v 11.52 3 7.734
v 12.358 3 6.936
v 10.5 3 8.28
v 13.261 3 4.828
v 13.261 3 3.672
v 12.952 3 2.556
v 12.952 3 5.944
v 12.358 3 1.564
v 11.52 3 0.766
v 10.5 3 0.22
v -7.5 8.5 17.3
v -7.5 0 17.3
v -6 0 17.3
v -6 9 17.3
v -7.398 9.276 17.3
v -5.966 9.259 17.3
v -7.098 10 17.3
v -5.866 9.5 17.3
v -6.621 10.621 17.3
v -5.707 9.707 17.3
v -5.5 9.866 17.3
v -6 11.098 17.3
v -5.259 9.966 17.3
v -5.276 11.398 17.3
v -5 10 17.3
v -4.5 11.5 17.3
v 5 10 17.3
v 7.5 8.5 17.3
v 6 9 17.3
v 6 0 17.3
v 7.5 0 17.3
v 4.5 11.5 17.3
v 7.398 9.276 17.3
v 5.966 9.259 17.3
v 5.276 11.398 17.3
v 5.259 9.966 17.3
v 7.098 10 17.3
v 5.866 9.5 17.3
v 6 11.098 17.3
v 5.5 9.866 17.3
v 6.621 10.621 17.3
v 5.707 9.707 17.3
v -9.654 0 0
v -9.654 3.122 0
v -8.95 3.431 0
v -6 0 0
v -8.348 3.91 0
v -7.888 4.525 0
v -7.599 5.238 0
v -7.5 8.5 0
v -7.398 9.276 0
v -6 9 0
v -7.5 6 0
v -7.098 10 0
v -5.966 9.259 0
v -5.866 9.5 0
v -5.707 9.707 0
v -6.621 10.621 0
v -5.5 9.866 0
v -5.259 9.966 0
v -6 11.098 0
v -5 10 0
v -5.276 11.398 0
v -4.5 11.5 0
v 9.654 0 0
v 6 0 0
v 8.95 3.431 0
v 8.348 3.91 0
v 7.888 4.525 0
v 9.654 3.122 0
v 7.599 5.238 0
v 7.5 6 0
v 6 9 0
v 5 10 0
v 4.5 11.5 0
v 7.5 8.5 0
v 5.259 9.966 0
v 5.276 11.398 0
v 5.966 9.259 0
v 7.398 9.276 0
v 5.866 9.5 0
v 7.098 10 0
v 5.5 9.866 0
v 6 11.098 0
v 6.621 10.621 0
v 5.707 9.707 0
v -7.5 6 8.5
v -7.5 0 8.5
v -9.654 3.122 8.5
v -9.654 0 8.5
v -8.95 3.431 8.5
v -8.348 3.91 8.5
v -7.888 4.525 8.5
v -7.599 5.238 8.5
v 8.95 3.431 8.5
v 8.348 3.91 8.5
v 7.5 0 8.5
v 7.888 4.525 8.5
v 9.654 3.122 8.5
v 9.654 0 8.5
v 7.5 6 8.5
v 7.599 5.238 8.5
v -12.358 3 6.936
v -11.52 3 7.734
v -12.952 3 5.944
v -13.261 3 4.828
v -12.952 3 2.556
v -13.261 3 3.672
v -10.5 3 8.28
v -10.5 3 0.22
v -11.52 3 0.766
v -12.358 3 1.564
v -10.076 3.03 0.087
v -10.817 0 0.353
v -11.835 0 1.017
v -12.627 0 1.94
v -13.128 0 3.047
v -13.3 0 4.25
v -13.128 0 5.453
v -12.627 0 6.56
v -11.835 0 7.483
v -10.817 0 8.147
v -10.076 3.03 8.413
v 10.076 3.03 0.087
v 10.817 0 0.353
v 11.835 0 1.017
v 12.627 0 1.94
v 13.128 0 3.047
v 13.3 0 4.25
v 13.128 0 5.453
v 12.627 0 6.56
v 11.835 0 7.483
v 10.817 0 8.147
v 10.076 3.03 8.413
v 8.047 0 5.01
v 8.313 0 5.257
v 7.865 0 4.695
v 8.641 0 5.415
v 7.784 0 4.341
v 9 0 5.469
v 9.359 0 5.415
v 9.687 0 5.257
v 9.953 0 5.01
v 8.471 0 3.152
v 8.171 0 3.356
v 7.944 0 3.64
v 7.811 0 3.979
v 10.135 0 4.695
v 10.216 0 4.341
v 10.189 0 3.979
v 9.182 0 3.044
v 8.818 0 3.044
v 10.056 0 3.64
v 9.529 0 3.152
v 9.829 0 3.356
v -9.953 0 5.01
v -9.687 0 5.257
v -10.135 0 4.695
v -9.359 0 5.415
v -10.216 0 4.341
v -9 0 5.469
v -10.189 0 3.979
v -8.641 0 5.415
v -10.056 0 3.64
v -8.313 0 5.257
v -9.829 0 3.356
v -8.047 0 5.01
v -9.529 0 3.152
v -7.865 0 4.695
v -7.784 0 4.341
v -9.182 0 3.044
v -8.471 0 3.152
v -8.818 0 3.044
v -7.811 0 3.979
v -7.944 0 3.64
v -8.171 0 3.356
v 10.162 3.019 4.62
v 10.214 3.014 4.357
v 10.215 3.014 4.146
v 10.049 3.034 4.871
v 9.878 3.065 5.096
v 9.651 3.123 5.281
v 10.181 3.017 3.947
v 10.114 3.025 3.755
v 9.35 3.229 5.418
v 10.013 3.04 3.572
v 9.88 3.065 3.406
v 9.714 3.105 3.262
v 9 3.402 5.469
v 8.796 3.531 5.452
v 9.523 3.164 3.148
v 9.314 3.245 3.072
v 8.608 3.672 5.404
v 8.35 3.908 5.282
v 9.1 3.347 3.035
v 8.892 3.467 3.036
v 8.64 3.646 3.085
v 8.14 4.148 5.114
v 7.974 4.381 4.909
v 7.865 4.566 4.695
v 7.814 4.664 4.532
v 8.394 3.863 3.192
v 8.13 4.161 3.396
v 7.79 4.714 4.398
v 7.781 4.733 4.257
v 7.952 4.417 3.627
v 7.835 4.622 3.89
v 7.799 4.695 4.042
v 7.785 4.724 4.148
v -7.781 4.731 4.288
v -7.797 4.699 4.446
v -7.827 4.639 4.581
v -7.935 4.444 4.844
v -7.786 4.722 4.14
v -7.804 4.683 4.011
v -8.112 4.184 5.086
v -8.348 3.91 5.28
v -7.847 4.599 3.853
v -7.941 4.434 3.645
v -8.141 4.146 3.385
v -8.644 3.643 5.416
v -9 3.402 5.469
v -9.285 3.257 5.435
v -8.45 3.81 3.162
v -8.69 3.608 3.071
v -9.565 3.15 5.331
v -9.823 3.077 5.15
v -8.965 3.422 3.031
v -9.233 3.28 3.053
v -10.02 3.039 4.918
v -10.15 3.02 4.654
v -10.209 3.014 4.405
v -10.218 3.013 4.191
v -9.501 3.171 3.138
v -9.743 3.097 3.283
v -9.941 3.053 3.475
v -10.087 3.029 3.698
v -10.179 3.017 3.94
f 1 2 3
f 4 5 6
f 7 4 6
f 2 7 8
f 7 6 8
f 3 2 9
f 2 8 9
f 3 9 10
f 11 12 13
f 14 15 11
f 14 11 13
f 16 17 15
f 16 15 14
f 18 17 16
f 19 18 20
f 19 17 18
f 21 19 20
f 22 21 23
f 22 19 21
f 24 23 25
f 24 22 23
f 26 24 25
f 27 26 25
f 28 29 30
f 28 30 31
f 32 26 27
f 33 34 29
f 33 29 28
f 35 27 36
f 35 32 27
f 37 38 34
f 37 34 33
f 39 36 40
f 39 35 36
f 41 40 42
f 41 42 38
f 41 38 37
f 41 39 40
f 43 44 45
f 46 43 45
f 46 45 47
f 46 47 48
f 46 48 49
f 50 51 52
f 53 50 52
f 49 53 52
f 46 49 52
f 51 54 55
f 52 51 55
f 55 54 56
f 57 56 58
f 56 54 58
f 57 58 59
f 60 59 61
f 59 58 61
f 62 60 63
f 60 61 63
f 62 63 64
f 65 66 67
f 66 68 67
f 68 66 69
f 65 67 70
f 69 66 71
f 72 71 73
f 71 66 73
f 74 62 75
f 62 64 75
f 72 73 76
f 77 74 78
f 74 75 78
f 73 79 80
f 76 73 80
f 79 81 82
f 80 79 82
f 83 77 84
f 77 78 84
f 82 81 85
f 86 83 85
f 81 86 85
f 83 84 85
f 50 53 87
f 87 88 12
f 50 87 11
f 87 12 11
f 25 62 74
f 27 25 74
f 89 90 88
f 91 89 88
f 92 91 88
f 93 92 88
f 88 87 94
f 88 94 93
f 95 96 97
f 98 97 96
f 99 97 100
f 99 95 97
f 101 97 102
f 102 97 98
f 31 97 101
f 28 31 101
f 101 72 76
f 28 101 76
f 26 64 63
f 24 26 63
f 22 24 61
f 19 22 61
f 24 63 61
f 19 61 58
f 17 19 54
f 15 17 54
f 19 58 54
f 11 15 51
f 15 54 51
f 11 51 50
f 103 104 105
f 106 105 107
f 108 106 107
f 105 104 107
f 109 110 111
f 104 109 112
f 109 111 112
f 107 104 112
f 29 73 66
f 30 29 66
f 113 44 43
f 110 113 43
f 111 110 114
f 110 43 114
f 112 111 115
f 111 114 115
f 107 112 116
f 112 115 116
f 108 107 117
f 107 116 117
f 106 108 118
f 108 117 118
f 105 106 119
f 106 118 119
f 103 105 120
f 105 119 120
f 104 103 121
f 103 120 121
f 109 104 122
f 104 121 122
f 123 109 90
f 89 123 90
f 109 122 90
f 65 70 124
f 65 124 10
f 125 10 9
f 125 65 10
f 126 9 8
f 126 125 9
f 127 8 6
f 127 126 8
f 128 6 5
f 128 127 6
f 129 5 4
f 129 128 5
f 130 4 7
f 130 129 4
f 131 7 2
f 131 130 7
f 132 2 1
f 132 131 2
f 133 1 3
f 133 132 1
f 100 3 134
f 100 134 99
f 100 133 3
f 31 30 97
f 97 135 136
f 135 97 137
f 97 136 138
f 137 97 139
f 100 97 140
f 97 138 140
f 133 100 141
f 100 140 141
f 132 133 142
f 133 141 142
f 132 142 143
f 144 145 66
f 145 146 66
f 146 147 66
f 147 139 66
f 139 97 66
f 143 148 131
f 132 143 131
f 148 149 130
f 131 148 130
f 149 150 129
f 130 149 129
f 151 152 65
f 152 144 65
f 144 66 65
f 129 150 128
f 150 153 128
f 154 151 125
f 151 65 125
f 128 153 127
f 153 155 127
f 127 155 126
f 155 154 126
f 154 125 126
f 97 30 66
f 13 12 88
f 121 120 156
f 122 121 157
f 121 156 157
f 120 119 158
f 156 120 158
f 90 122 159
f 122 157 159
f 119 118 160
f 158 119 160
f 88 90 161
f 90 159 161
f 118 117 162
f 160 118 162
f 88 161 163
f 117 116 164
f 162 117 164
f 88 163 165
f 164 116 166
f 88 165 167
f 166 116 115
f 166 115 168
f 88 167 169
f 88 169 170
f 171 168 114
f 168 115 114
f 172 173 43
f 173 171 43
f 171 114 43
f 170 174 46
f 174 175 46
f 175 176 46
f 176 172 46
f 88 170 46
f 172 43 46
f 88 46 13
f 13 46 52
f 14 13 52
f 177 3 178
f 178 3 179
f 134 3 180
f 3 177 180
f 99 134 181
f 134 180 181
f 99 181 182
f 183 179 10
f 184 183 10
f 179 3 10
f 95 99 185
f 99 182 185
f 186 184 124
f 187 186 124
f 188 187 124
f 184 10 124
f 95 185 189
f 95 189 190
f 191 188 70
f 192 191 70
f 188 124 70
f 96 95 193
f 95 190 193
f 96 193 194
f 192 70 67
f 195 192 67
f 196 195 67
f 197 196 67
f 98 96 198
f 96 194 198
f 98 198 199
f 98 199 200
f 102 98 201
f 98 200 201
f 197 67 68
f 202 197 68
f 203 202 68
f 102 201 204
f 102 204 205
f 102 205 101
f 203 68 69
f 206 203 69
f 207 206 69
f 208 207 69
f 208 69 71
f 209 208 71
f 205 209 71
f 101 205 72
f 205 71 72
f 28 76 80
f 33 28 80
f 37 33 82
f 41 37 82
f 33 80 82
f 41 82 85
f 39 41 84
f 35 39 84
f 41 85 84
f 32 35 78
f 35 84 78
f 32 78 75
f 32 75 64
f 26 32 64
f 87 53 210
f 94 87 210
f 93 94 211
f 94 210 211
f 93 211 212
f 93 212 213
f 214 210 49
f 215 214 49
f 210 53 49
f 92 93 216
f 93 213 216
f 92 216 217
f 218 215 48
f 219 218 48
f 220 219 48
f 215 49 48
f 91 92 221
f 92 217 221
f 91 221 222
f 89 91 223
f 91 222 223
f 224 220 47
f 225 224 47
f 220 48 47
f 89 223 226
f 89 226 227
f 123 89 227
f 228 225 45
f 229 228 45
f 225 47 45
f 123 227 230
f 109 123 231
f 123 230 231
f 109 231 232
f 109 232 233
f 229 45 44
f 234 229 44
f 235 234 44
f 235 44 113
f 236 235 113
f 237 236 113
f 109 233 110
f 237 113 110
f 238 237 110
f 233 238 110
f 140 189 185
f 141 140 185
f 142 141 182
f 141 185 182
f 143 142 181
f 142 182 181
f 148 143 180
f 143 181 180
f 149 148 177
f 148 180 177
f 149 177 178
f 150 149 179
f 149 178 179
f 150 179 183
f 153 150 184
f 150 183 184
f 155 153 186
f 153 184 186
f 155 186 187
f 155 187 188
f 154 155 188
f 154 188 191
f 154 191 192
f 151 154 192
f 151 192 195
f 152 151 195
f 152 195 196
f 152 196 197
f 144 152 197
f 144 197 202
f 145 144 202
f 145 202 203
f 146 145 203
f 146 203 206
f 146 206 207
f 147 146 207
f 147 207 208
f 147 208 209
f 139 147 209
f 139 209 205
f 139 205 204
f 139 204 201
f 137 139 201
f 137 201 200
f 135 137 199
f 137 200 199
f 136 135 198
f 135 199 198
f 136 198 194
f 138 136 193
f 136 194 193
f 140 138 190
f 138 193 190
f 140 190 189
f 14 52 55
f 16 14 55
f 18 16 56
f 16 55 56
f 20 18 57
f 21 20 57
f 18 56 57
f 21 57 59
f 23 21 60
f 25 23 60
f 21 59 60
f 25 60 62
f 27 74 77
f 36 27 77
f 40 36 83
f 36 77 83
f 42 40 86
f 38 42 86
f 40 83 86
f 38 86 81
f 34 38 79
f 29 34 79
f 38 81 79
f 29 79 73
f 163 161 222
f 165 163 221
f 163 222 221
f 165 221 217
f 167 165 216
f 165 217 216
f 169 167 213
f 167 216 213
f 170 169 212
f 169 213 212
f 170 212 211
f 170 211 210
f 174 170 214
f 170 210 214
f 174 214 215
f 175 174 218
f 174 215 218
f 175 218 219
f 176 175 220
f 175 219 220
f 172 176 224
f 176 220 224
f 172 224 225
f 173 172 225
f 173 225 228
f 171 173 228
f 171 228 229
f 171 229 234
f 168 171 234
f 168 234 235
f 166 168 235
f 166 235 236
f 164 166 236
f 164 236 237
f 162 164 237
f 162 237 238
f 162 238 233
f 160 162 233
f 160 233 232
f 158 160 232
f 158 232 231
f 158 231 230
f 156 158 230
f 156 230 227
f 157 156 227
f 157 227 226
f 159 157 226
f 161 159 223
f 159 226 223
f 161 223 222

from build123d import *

# Parameters (mm, degrees)
EXTRUDE1_DEPTH            = 17.3
SKETCH2_W                 = 5.8
SKETCH2_H                 = 8.5
EXTRUDE2_DEPTH            = 8.8
SKETCH3_R                 = 1
EXTRUDE3_DEPTH            = 5
F_2_CLEARANCE_HOLE1_D     = 2.4384
F_2_CLEARANCE_HOLE1_DEPTH = 11.5


with BuildPart() as part:
    # Sketch1 → Extrude1 (new body)
    with BuildSketch(Plane.XY):
        with BuildLine():
            Line((-13.3, 0), (-6, 0))
            Line((-6, 0), (-6, 9))
            ThreePointArc((-6, 9), (-5.707106781, 9.707106781), (-5, 10))
            Line((-5, 10), (5, 10))
            ThreePointArc((5, 10), (5.707106781, 9.707106781), (6, 9))
            Line((6, 9), (6, 0))
            Line((6, 0), (13.3, 0))
            Line((13.3, 0), (13.3, 3))
            Line((13.3, 3), (10.5, 3))
            ThreePointArc((10.5, 3), (8.378679656, 3.878679656), (7.5, 6))
            Line((7.5, 6), (7.5, 8.5))
            ThreePointArc((7.5, 8.5), (6.621320344, 10.621320344), (4.5, 11.5))
            Line((4.5, 11.5), (-4.5, 11.5))
            ThreePointArc((-4.5, 11.5), (-6.621320344, 10.621320344), (-7.5, 8.5))
            Line((-7.5, 8.5), (-7.5, 6))
            ThreePointArc((-7.5, 6), (-8.378679656, 3.878679656), (-10.5, 3))
            Line((-10.5, 3), (-13.3, 3))
            Line((-13.3, 3), (-13.3, 0))
        make_face()
    extrude(amount=EXTRUDE1_DEPTH)

    # Sketch2 → Extrude2 (cut)
    with BuildSketch(Plane.XY.offset(17.3)):
        with Locations((-10.4, 4.25)):
            Rectangle(SKETCH2_W, SKETCH2_H)
        with Locations((10.4, 4.25)):
            Rectangle(SKETCH2_W, SKETCH2_H)
    extrude(amount=-EXTRUDE2_DEPTH, mode=Mode.SUBTRACT)

    # Sketch3 → Extrude3 (cut)
    with BuildSketch(Plane.XZ):
        with Locations(Location((-9, 4.25, 0), (0, 0, 270))):  # turned: the seam where the file's is
            Circle(SKETCH3_R)
        with Locations(Location((9, 4.25, 0), (0, 0, 270))):  # turned: the seam where the file's is
            Circle(SKETCH3_R)
        with BuildLine():
            Line((9.653834842, 8.5), (9.653834842, 9.262963398))
            Line((9.653834842, 9.262963398), (15.079268599, 9.262963398))
            Line((15.079268599, 9.262963398), (15.079268599, -0.486230121))
            Line((15.079268599, -0.486230121), (9.653834842, -0.486230121))
            Line((9.653834842, -0.486230121), (9.653834842, 0))
            ThreePointArc((9.653834842, 0), (13.3, 4.25), (9.653834842, 8.5))
        make_face()
        with BuildLine():
            Line((-9.653834842, -0.486230121), (-9.653834842, 0))
            ThreePointArc((-9.653834842, 0), (-13.3, 4.25), (-9.653834842, 8.5))
            Line((-9.653834842, 8.5), (-9.653834842, 9.262963398))
            Line((-9.653834842, 9.262963398), (-15.079268599, 9.262963398))
            Line((-15.079268599, 9.262963398), (-15.079268599, -0.486230121))
            Line((-15.079268599, -0.486230121), (-9.653834842, -0.486230121))
        make_face()
    extrude(amount=-EXTRUDE3_DEPTH, mode=Mode.SUBTRACT)

    # #2 Clearance Hole1
    with Locations(Plane(origin=(-9, 0, 4.25), x_dir=(0, 0, -1), z_dir=(0, -1, 0))):
        with Locations((0, 0), (0, 18)):
            Hole(F_2_CLEARANCE_HOLE1_D / 2, depth=F_2_CLEARANCE_HOLE1_DEPTH)


solid = part.part
